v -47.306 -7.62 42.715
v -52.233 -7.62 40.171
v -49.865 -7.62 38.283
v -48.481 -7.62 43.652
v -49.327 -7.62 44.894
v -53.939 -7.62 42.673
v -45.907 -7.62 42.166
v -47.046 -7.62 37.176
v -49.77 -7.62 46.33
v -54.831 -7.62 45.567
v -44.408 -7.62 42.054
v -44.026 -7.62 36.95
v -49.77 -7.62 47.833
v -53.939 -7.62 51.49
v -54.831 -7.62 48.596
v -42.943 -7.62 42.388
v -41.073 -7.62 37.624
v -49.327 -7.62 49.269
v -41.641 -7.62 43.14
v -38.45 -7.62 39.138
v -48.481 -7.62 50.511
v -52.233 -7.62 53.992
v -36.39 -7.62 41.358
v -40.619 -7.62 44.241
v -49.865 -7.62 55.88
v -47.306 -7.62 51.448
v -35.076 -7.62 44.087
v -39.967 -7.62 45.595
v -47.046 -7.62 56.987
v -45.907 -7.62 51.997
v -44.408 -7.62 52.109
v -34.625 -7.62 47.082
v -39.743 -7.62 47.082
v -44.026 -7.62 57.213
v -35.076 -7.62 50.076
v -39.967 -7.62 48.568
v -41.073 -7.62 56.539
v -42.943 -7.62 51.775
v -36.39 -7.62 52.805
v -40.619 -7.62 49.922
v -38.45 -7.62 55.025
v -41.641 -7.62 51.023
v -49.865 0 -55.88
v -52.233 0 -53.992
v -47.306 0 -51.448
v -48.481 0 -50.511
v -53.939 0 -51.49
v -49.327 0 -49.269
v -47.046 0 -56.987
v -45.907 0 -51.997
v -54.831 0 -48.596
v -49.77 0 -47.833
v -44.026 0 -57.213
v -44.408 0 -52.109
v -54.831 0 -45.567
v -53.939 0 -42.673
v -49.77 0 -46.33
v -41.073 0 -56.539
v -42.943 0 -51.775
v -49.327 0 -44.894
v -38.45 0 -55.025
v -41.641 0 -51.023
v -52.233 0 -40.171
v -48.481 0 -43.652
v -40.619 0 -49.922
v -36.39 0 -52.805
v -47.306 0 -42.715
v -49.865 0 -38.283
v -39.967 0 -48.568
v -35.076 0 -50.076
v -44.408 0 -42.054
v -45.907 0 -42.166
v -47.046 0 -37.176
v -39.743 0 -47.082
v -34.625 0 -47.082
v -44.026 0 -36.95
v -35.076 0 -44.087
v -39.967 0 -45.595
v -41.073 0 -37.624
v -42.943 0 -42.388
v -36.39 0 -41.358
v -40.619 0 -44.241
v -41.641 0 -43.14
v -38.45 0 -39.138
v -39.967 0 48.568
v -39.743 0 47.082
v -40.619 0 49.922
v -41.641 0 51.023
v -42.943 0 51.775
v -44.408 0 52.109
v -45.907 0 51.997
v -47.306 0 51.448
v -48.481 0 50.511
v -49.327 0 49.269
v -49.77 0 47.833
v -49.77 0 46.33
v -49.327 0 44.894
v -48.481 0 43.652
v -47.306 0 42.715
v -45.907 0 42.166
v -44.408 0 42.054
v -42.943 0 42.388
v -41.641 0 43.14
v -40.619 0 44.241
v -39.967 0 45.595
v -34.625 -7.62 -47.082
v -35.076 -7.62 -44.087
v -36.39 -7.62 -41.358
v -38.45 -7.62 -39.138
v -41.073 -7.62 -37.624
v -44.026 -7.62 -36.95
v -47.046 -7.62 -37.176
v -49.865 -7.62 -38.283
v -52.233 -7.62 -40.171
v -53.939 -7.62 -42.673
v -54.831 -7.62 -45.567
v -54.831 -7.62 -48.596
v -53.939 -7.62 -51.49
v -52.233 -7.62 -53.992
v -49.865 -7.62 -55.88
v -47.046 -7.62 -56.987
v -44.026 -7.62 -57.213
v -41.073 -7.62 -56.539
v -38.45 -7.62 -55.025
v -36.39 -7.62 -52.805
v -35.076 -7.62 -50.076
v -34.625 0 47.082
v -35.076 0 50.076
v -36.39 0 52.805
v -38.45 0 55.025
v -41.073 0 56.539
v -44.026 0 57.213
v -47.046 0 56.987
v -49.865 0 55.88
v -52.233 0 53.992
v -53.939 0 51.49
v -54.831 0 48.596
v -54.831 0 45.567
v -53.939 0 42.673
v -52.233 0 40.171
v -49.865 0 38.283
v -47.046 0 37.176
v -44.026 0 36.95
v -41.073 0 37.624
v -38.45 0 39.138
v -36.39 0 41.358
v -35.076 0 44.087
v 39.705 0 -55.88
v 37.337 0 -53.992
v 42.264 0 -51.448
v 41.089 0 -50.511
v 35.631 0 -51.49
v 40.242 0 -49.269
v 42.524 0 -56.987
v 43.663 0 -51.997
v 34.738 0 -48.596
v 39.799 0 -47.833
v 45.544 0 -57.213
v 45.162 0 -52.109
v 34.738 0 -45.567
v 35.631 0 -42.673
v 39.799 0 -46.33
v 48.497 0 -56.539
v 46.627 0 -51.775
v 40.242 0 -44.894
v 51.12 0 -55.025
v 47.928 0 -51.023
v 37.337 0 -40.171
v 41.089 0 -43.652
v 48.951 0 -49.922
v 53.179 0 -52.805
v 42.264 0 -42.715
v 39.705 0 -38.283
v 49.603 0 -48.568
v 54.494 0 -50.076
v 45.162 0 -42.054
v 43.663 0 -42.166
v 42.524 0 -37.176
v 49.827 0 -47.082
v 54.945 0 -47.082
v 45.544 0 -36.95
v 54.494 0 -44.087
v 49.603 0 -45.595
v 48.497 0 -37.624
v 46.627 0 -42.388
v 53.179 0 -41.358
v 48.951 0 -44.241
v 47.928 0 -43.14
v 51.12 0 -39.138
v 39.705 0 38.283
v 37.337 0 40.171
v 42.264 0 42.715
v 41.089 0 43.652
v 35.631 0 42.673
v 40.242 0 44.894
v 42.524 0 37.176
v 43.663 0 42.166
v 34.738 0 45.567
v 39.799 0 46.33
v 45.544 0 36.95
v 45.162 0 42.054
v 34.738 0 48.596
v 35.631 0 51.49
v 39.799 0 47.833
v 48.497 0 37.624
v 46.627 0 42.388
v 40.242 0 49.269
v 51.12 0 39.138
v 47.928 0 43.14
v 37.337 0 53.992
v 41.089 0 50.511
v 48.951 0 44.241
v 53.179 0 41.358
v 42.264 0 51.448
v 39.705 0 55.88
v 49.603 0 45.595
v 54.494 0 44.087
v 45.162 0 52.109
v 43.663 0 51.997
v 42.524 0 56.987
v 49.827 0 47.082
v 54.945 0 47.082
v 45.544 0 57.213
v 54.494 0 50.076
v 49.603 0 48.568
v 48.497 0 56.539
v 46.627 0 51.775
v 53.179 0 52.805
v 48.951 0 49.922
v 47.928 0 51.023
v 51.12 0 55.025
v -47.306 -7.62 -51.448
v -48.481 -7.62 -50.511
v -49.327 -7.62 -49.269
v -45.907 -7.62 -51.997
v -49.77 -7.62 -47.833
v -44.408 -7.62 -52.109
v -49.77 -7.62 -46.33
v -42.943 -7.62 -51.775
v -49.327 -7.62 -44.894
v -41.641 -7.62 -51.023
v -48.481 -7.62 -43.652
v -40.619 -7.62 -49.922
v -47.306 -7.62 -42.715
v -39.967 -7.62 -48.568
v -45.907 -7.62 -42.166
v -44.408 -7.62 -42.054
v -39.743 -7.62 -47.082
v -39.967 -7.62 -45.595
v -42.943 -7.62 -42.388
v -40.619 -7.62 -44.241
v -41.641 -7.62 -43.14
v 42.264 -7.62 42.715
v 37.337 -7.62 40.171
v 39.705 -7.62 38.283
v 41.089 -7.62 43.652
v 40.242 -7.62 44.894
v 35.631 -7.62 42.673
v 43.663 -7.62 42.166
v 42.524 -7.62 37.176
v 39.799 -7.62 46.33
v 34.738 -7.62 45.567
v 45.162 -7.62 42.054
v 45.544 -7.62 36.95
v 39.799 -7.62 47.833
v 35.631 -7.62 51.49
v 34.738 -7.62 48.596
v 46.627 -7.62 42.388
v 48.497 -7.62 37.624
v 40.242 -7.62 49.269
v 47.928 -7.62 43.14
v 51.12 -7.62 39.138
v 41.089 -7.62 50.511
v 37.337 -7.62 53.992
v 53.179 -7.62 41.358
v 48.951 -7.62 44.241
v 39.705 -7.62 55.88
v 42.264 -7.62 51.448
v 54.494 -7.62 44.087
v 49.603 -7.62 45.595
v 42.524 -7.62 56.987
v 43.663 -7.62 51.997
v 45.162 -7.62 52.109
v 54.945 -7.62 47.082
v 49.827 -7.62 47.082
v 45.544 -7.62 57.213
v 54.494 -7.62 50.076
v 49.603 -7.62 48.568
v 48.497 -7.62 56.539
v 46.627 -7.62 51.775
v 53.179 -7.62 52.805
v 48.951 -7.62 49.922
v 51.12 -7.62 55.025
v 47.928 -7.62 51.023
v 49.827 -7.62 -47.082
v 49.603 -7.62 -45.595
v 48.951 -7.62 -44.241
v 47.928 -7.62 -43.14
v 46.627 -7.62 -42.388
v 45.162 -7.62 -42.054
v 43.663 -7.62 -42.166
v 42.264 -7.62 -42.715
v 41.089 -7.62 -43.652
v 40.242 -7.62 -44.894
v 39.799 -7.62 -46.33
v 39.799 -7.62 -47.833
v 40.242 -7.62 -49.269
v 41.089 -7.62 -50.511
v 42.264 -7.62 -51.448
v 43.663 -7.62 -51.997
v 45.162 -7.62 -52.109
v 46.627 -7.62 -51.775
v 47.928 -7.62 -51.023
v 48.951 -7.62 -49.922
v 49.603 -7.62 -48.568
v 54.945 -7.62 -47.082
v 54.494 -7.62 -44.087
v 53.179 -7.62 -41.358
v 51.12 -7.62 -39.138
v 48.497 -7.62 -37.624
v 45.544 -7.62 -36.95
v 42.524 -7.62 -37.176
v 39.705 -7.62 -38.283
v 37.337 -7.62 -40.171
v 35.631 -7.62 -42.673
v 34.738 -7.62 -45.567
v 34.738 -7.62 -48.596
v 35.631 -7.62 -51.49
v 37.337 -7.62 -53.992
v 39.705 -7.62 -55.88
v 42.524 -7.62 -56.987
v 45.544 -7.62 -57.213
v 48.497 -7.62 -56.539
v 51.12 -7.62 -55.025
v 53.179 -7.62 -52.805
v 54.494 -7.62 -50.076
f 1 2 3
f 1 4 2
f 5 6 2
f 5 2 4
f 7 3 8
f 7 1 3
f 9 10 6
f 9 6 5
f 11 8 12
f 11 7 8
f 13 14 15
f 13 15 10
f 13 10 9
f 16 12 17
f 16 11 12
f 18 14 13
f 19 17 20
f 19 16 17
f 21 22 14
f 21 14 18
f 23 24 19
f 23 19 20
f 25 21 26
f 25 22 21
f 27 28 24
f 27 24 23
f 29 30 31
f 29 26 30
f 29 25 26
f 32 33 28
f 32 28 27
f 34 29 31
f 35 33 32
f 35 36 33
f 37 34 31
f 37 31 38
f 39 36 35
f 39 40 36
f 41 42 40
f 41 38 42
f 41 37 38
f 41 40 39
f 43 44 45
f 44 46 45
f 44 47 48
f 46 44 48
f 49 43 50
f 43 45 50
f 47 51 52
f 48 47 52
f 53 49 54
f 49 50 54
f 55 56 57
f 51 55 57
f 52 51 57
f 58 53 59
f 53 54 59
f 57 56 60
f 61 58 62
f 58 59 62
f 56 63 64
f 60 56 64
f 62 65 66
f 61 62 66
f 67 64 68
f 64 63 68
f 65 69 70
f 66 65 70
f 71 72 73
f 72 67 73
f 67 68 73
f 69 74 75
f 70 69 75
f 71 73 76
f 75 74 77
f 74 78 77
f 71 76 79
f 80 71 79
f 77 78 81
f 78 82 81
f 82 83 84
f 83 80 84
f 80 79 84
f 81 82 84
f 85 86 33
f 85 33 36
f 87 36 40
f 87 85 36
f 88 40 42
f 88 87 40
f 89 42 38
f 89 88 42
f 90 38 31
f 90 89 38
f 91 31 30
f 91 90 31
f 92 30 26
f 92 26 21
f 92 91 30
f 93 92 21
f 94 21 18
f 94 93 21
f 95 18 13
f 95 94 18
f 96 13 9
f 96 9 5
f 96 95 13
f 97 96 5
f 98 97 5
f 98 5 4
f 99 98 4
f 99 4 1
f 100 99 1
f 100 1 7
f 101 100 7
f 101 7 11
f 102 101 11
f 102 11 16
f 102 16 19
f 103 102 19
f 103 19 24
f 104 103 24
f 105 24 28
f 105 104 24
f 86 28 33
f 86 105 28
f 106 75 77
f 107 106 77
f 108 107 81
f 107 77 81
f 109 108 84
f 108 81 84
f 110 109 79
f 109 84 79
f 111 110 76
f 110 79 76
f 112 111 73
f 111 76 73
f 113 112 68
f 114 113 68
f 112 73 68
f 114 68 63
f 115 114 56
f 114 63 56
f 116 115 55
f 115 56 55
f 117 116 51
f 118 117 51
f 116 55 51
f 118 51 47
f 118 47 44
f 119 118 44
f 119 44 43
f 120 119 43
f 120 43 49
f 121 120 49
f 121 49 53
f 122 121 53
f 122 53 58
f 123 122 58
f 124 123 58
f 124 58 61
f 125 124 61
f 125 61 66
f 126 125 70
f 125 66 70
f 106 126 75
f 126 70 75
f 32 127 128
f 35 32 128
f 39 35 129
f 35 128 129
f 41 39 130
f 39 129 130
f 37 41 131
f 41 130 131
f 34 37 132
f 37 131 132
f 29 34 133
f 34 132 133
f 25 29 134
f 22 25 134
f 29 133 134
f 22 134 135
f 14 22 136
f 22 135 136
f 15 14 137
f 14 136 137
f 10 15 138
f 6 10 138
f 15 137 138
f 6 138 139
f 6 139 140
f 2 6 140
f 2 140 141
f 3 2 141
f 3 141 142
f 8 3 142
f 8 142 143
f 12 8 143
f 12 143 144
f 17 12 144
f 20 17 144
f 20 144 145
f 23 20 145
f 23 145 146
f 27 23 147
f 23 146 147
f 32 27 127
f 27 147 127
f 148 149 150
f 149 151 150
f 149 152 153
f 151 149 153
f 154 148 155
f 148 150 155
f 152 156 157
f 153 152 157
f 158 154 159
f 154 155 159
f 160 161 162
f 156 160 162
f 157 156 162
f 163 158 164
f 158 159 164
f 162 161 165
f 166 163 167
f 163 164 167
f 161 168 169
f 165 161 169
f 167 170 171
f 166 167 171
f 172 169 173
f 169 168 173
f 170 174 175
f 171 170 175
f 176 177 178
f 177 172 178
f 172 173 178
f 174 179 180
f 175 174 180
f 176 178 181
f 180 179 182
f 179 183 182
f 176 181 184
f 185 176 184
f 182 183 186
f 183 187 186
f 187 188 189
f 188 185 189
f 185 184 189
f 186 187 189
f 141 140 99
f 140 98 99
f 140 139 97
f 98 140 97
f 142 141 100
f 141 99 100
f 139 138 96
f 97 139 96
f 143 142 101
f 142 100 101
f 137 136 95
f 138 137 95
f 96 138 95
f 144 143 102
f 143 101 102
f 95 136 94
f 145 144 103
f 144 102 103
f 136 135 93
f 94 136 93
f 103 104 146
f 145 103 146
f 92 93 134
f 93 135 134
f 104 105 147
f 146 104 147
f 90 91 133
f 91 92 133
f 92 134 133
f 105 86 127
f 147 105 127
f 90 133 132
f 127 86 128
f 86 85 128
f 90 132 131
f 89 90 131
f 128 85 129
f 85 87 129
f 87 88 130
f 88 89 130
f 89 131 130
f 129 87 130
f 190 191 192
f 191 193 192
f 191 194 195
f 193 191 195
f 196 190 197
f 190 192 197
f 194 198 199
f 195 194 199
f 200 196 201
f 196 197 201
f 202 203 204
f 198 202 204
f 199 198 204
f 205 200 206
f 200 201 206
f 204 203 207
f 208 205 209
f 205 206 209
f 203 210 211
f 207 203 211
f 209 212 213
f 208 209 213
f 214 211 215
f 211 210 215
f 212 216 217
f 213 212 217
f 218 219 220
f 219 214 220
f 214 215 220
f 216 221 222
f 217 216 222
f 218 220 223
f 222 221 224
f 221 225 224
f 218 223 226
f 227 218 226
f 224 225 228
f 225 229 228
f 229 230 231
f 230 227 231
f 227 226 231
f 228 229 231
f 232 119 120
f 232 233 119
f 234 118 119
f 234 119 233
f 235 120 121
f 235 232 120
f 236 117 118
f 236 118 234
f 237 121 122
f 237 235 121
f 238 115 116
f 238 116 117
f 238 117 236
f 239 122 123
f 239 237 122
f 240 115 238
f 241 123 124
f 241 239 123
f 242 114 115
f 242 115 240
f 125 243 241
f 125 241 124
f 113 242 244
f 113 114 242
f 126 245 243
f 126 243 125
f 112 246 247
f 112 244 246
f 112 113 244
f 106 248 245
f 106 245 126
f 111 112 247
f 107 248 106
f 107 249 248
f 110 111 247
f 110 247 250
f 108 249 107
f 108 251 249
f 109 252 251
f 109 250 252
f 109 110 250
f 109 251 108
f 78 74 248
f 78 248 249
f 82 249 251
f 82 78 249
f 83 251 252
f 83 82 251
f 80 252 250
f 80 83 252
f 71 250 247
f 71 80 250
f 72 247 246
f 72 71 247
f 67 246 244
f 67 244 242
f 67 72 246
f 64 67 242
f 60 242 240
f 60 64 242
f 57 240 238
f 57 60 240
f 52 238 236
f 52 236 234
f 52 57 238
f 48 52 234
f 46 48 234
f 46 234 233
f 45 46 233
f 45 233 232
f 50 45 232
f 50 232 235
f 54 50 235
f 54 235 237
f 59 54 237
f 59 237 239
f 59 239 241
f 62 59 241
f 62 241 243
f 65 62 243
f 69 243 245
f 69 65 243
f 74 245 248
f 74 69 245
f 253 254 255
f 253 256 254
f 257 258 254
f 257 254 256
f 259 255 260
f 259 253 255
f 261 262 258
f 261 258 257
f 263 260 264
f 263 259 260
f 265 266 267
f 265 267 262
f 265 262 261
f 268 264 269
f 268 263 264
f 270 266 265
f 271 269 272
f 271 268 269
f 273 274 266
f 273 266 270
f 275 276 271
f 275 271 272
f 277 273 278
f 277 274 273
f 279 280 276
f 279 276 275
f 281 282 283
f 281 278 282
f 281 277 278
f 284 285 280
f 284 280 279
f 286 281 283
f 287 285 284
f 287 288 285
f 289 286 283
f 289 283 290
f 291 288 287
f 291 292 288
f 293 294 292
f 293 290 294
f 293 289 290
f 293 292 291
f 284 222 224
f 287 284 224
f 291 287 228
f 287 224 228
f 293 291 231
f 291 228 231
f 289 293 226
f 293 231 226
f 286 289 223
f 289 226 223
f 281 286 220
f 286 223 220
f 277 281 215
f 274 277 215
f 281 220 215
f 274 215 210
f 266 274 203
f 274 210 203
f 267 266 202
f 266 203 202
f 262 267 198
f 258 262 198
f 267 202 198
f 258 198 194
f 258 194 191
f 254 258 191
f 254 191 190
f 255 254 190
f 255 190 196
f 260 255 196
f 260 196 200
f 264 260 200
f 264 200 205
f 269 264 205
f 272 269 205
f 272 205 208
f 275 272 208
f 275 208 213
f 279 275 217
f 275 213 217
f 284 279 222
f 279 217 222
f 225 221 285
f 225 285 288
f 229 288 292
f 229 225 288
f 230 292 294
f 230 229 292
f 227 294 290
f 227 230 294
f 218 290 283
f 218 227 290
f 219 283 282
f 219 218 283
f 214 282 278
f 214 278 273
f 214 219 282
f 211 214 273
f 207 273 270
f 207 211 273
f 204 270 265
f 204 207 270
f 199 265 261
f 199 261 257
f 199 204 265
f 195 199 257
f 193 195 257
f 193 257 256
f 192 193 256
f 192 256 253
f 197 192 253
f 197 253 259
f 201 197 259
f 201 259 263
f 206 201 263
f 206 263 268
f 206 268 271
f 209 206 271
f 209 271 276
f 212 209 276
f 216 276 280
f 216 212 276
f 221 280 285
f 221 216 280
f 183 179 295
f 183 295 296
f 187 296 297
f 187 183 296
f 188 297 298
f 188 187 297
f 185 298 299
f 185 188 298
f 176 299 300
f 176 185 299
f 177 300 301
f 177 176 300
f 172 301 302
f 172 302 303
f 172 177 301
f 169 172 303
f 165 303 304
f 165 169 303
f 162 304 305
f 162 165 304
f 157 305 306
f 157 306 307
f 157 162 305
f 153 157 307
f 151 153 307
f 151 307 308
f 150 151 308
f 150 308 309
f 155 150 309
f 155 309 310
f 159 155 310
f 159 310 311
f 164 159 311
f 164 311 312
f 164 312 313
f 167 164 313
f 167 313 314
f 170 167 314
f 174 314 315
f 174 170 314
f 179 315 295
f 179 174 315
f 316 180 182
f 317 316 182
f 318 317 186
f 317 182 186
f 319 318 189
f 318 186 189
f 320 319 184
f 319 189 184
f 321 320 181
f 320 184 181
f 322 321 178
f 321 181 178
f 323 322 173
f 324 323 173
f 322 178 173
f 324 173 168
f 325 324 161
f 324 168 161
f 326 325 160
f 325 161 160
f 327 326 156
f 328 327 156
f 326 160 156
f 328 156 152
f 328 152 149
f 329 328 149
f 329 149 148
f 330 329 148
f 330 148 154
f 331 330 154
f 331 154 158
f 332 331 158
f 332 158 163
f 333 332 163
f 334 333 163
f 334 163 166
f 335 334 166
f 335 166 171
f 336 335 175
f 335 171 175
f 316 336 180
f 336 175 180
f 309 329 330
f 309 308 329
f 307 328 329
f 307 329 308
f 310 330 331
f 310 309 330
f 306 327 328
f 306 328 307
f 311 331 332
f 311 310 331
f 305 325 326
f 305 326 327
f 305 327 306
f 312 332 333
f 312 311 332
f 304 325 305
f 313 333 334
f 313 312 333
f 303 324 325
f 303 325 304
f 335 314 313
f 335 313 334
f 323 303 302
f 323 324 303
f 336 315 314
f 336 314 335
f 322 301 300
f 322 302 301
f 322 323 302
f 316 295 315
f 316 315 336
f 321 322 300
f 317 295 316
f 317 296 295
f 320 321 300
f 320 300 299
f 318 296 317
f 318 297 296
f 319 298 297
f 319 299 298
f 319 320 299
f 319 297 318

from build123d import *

# Parameters (mm, degrees)
F0_R     = 10.16
F0_R_2   = 5.0419
F1_DEPTH = 7.62


with BuildPart() as f1:
    # F0 (on Front) → F1 (new body)
    with BuildSketch(Plane.XZ):
        with Locations((-44.78489, 47.08155)):
            Circle(F0_R)
        with Locations((-44.78489, 47.08155)):
            Circle(F0_R_2, mode=Mode.SUBTRACT)
        with Locations((44.78489, 47.08155)):
            Circle(F0_R)
        with Locations((44.78489, 47.08155)):
            Circle(F0_R_2, mode=Mode.SUBTRACT)
        with Locations((-44.78489, -47.08155)):
            Circle(F0_R)
        with Locations((-44.78489, -47.08155)):
            Circle(F0_R_2, mode=Mode.SUBTRACT)
        with Locations((44.78489, -47.08155)):
            Circle(F0_R)
        with Locations((44.78489, -47.08155)):
            Circle(F0_R_2, mode=Mode.SUBTRACT)
    extrude(amount=F1_DEPTH)


solid = f1.part
